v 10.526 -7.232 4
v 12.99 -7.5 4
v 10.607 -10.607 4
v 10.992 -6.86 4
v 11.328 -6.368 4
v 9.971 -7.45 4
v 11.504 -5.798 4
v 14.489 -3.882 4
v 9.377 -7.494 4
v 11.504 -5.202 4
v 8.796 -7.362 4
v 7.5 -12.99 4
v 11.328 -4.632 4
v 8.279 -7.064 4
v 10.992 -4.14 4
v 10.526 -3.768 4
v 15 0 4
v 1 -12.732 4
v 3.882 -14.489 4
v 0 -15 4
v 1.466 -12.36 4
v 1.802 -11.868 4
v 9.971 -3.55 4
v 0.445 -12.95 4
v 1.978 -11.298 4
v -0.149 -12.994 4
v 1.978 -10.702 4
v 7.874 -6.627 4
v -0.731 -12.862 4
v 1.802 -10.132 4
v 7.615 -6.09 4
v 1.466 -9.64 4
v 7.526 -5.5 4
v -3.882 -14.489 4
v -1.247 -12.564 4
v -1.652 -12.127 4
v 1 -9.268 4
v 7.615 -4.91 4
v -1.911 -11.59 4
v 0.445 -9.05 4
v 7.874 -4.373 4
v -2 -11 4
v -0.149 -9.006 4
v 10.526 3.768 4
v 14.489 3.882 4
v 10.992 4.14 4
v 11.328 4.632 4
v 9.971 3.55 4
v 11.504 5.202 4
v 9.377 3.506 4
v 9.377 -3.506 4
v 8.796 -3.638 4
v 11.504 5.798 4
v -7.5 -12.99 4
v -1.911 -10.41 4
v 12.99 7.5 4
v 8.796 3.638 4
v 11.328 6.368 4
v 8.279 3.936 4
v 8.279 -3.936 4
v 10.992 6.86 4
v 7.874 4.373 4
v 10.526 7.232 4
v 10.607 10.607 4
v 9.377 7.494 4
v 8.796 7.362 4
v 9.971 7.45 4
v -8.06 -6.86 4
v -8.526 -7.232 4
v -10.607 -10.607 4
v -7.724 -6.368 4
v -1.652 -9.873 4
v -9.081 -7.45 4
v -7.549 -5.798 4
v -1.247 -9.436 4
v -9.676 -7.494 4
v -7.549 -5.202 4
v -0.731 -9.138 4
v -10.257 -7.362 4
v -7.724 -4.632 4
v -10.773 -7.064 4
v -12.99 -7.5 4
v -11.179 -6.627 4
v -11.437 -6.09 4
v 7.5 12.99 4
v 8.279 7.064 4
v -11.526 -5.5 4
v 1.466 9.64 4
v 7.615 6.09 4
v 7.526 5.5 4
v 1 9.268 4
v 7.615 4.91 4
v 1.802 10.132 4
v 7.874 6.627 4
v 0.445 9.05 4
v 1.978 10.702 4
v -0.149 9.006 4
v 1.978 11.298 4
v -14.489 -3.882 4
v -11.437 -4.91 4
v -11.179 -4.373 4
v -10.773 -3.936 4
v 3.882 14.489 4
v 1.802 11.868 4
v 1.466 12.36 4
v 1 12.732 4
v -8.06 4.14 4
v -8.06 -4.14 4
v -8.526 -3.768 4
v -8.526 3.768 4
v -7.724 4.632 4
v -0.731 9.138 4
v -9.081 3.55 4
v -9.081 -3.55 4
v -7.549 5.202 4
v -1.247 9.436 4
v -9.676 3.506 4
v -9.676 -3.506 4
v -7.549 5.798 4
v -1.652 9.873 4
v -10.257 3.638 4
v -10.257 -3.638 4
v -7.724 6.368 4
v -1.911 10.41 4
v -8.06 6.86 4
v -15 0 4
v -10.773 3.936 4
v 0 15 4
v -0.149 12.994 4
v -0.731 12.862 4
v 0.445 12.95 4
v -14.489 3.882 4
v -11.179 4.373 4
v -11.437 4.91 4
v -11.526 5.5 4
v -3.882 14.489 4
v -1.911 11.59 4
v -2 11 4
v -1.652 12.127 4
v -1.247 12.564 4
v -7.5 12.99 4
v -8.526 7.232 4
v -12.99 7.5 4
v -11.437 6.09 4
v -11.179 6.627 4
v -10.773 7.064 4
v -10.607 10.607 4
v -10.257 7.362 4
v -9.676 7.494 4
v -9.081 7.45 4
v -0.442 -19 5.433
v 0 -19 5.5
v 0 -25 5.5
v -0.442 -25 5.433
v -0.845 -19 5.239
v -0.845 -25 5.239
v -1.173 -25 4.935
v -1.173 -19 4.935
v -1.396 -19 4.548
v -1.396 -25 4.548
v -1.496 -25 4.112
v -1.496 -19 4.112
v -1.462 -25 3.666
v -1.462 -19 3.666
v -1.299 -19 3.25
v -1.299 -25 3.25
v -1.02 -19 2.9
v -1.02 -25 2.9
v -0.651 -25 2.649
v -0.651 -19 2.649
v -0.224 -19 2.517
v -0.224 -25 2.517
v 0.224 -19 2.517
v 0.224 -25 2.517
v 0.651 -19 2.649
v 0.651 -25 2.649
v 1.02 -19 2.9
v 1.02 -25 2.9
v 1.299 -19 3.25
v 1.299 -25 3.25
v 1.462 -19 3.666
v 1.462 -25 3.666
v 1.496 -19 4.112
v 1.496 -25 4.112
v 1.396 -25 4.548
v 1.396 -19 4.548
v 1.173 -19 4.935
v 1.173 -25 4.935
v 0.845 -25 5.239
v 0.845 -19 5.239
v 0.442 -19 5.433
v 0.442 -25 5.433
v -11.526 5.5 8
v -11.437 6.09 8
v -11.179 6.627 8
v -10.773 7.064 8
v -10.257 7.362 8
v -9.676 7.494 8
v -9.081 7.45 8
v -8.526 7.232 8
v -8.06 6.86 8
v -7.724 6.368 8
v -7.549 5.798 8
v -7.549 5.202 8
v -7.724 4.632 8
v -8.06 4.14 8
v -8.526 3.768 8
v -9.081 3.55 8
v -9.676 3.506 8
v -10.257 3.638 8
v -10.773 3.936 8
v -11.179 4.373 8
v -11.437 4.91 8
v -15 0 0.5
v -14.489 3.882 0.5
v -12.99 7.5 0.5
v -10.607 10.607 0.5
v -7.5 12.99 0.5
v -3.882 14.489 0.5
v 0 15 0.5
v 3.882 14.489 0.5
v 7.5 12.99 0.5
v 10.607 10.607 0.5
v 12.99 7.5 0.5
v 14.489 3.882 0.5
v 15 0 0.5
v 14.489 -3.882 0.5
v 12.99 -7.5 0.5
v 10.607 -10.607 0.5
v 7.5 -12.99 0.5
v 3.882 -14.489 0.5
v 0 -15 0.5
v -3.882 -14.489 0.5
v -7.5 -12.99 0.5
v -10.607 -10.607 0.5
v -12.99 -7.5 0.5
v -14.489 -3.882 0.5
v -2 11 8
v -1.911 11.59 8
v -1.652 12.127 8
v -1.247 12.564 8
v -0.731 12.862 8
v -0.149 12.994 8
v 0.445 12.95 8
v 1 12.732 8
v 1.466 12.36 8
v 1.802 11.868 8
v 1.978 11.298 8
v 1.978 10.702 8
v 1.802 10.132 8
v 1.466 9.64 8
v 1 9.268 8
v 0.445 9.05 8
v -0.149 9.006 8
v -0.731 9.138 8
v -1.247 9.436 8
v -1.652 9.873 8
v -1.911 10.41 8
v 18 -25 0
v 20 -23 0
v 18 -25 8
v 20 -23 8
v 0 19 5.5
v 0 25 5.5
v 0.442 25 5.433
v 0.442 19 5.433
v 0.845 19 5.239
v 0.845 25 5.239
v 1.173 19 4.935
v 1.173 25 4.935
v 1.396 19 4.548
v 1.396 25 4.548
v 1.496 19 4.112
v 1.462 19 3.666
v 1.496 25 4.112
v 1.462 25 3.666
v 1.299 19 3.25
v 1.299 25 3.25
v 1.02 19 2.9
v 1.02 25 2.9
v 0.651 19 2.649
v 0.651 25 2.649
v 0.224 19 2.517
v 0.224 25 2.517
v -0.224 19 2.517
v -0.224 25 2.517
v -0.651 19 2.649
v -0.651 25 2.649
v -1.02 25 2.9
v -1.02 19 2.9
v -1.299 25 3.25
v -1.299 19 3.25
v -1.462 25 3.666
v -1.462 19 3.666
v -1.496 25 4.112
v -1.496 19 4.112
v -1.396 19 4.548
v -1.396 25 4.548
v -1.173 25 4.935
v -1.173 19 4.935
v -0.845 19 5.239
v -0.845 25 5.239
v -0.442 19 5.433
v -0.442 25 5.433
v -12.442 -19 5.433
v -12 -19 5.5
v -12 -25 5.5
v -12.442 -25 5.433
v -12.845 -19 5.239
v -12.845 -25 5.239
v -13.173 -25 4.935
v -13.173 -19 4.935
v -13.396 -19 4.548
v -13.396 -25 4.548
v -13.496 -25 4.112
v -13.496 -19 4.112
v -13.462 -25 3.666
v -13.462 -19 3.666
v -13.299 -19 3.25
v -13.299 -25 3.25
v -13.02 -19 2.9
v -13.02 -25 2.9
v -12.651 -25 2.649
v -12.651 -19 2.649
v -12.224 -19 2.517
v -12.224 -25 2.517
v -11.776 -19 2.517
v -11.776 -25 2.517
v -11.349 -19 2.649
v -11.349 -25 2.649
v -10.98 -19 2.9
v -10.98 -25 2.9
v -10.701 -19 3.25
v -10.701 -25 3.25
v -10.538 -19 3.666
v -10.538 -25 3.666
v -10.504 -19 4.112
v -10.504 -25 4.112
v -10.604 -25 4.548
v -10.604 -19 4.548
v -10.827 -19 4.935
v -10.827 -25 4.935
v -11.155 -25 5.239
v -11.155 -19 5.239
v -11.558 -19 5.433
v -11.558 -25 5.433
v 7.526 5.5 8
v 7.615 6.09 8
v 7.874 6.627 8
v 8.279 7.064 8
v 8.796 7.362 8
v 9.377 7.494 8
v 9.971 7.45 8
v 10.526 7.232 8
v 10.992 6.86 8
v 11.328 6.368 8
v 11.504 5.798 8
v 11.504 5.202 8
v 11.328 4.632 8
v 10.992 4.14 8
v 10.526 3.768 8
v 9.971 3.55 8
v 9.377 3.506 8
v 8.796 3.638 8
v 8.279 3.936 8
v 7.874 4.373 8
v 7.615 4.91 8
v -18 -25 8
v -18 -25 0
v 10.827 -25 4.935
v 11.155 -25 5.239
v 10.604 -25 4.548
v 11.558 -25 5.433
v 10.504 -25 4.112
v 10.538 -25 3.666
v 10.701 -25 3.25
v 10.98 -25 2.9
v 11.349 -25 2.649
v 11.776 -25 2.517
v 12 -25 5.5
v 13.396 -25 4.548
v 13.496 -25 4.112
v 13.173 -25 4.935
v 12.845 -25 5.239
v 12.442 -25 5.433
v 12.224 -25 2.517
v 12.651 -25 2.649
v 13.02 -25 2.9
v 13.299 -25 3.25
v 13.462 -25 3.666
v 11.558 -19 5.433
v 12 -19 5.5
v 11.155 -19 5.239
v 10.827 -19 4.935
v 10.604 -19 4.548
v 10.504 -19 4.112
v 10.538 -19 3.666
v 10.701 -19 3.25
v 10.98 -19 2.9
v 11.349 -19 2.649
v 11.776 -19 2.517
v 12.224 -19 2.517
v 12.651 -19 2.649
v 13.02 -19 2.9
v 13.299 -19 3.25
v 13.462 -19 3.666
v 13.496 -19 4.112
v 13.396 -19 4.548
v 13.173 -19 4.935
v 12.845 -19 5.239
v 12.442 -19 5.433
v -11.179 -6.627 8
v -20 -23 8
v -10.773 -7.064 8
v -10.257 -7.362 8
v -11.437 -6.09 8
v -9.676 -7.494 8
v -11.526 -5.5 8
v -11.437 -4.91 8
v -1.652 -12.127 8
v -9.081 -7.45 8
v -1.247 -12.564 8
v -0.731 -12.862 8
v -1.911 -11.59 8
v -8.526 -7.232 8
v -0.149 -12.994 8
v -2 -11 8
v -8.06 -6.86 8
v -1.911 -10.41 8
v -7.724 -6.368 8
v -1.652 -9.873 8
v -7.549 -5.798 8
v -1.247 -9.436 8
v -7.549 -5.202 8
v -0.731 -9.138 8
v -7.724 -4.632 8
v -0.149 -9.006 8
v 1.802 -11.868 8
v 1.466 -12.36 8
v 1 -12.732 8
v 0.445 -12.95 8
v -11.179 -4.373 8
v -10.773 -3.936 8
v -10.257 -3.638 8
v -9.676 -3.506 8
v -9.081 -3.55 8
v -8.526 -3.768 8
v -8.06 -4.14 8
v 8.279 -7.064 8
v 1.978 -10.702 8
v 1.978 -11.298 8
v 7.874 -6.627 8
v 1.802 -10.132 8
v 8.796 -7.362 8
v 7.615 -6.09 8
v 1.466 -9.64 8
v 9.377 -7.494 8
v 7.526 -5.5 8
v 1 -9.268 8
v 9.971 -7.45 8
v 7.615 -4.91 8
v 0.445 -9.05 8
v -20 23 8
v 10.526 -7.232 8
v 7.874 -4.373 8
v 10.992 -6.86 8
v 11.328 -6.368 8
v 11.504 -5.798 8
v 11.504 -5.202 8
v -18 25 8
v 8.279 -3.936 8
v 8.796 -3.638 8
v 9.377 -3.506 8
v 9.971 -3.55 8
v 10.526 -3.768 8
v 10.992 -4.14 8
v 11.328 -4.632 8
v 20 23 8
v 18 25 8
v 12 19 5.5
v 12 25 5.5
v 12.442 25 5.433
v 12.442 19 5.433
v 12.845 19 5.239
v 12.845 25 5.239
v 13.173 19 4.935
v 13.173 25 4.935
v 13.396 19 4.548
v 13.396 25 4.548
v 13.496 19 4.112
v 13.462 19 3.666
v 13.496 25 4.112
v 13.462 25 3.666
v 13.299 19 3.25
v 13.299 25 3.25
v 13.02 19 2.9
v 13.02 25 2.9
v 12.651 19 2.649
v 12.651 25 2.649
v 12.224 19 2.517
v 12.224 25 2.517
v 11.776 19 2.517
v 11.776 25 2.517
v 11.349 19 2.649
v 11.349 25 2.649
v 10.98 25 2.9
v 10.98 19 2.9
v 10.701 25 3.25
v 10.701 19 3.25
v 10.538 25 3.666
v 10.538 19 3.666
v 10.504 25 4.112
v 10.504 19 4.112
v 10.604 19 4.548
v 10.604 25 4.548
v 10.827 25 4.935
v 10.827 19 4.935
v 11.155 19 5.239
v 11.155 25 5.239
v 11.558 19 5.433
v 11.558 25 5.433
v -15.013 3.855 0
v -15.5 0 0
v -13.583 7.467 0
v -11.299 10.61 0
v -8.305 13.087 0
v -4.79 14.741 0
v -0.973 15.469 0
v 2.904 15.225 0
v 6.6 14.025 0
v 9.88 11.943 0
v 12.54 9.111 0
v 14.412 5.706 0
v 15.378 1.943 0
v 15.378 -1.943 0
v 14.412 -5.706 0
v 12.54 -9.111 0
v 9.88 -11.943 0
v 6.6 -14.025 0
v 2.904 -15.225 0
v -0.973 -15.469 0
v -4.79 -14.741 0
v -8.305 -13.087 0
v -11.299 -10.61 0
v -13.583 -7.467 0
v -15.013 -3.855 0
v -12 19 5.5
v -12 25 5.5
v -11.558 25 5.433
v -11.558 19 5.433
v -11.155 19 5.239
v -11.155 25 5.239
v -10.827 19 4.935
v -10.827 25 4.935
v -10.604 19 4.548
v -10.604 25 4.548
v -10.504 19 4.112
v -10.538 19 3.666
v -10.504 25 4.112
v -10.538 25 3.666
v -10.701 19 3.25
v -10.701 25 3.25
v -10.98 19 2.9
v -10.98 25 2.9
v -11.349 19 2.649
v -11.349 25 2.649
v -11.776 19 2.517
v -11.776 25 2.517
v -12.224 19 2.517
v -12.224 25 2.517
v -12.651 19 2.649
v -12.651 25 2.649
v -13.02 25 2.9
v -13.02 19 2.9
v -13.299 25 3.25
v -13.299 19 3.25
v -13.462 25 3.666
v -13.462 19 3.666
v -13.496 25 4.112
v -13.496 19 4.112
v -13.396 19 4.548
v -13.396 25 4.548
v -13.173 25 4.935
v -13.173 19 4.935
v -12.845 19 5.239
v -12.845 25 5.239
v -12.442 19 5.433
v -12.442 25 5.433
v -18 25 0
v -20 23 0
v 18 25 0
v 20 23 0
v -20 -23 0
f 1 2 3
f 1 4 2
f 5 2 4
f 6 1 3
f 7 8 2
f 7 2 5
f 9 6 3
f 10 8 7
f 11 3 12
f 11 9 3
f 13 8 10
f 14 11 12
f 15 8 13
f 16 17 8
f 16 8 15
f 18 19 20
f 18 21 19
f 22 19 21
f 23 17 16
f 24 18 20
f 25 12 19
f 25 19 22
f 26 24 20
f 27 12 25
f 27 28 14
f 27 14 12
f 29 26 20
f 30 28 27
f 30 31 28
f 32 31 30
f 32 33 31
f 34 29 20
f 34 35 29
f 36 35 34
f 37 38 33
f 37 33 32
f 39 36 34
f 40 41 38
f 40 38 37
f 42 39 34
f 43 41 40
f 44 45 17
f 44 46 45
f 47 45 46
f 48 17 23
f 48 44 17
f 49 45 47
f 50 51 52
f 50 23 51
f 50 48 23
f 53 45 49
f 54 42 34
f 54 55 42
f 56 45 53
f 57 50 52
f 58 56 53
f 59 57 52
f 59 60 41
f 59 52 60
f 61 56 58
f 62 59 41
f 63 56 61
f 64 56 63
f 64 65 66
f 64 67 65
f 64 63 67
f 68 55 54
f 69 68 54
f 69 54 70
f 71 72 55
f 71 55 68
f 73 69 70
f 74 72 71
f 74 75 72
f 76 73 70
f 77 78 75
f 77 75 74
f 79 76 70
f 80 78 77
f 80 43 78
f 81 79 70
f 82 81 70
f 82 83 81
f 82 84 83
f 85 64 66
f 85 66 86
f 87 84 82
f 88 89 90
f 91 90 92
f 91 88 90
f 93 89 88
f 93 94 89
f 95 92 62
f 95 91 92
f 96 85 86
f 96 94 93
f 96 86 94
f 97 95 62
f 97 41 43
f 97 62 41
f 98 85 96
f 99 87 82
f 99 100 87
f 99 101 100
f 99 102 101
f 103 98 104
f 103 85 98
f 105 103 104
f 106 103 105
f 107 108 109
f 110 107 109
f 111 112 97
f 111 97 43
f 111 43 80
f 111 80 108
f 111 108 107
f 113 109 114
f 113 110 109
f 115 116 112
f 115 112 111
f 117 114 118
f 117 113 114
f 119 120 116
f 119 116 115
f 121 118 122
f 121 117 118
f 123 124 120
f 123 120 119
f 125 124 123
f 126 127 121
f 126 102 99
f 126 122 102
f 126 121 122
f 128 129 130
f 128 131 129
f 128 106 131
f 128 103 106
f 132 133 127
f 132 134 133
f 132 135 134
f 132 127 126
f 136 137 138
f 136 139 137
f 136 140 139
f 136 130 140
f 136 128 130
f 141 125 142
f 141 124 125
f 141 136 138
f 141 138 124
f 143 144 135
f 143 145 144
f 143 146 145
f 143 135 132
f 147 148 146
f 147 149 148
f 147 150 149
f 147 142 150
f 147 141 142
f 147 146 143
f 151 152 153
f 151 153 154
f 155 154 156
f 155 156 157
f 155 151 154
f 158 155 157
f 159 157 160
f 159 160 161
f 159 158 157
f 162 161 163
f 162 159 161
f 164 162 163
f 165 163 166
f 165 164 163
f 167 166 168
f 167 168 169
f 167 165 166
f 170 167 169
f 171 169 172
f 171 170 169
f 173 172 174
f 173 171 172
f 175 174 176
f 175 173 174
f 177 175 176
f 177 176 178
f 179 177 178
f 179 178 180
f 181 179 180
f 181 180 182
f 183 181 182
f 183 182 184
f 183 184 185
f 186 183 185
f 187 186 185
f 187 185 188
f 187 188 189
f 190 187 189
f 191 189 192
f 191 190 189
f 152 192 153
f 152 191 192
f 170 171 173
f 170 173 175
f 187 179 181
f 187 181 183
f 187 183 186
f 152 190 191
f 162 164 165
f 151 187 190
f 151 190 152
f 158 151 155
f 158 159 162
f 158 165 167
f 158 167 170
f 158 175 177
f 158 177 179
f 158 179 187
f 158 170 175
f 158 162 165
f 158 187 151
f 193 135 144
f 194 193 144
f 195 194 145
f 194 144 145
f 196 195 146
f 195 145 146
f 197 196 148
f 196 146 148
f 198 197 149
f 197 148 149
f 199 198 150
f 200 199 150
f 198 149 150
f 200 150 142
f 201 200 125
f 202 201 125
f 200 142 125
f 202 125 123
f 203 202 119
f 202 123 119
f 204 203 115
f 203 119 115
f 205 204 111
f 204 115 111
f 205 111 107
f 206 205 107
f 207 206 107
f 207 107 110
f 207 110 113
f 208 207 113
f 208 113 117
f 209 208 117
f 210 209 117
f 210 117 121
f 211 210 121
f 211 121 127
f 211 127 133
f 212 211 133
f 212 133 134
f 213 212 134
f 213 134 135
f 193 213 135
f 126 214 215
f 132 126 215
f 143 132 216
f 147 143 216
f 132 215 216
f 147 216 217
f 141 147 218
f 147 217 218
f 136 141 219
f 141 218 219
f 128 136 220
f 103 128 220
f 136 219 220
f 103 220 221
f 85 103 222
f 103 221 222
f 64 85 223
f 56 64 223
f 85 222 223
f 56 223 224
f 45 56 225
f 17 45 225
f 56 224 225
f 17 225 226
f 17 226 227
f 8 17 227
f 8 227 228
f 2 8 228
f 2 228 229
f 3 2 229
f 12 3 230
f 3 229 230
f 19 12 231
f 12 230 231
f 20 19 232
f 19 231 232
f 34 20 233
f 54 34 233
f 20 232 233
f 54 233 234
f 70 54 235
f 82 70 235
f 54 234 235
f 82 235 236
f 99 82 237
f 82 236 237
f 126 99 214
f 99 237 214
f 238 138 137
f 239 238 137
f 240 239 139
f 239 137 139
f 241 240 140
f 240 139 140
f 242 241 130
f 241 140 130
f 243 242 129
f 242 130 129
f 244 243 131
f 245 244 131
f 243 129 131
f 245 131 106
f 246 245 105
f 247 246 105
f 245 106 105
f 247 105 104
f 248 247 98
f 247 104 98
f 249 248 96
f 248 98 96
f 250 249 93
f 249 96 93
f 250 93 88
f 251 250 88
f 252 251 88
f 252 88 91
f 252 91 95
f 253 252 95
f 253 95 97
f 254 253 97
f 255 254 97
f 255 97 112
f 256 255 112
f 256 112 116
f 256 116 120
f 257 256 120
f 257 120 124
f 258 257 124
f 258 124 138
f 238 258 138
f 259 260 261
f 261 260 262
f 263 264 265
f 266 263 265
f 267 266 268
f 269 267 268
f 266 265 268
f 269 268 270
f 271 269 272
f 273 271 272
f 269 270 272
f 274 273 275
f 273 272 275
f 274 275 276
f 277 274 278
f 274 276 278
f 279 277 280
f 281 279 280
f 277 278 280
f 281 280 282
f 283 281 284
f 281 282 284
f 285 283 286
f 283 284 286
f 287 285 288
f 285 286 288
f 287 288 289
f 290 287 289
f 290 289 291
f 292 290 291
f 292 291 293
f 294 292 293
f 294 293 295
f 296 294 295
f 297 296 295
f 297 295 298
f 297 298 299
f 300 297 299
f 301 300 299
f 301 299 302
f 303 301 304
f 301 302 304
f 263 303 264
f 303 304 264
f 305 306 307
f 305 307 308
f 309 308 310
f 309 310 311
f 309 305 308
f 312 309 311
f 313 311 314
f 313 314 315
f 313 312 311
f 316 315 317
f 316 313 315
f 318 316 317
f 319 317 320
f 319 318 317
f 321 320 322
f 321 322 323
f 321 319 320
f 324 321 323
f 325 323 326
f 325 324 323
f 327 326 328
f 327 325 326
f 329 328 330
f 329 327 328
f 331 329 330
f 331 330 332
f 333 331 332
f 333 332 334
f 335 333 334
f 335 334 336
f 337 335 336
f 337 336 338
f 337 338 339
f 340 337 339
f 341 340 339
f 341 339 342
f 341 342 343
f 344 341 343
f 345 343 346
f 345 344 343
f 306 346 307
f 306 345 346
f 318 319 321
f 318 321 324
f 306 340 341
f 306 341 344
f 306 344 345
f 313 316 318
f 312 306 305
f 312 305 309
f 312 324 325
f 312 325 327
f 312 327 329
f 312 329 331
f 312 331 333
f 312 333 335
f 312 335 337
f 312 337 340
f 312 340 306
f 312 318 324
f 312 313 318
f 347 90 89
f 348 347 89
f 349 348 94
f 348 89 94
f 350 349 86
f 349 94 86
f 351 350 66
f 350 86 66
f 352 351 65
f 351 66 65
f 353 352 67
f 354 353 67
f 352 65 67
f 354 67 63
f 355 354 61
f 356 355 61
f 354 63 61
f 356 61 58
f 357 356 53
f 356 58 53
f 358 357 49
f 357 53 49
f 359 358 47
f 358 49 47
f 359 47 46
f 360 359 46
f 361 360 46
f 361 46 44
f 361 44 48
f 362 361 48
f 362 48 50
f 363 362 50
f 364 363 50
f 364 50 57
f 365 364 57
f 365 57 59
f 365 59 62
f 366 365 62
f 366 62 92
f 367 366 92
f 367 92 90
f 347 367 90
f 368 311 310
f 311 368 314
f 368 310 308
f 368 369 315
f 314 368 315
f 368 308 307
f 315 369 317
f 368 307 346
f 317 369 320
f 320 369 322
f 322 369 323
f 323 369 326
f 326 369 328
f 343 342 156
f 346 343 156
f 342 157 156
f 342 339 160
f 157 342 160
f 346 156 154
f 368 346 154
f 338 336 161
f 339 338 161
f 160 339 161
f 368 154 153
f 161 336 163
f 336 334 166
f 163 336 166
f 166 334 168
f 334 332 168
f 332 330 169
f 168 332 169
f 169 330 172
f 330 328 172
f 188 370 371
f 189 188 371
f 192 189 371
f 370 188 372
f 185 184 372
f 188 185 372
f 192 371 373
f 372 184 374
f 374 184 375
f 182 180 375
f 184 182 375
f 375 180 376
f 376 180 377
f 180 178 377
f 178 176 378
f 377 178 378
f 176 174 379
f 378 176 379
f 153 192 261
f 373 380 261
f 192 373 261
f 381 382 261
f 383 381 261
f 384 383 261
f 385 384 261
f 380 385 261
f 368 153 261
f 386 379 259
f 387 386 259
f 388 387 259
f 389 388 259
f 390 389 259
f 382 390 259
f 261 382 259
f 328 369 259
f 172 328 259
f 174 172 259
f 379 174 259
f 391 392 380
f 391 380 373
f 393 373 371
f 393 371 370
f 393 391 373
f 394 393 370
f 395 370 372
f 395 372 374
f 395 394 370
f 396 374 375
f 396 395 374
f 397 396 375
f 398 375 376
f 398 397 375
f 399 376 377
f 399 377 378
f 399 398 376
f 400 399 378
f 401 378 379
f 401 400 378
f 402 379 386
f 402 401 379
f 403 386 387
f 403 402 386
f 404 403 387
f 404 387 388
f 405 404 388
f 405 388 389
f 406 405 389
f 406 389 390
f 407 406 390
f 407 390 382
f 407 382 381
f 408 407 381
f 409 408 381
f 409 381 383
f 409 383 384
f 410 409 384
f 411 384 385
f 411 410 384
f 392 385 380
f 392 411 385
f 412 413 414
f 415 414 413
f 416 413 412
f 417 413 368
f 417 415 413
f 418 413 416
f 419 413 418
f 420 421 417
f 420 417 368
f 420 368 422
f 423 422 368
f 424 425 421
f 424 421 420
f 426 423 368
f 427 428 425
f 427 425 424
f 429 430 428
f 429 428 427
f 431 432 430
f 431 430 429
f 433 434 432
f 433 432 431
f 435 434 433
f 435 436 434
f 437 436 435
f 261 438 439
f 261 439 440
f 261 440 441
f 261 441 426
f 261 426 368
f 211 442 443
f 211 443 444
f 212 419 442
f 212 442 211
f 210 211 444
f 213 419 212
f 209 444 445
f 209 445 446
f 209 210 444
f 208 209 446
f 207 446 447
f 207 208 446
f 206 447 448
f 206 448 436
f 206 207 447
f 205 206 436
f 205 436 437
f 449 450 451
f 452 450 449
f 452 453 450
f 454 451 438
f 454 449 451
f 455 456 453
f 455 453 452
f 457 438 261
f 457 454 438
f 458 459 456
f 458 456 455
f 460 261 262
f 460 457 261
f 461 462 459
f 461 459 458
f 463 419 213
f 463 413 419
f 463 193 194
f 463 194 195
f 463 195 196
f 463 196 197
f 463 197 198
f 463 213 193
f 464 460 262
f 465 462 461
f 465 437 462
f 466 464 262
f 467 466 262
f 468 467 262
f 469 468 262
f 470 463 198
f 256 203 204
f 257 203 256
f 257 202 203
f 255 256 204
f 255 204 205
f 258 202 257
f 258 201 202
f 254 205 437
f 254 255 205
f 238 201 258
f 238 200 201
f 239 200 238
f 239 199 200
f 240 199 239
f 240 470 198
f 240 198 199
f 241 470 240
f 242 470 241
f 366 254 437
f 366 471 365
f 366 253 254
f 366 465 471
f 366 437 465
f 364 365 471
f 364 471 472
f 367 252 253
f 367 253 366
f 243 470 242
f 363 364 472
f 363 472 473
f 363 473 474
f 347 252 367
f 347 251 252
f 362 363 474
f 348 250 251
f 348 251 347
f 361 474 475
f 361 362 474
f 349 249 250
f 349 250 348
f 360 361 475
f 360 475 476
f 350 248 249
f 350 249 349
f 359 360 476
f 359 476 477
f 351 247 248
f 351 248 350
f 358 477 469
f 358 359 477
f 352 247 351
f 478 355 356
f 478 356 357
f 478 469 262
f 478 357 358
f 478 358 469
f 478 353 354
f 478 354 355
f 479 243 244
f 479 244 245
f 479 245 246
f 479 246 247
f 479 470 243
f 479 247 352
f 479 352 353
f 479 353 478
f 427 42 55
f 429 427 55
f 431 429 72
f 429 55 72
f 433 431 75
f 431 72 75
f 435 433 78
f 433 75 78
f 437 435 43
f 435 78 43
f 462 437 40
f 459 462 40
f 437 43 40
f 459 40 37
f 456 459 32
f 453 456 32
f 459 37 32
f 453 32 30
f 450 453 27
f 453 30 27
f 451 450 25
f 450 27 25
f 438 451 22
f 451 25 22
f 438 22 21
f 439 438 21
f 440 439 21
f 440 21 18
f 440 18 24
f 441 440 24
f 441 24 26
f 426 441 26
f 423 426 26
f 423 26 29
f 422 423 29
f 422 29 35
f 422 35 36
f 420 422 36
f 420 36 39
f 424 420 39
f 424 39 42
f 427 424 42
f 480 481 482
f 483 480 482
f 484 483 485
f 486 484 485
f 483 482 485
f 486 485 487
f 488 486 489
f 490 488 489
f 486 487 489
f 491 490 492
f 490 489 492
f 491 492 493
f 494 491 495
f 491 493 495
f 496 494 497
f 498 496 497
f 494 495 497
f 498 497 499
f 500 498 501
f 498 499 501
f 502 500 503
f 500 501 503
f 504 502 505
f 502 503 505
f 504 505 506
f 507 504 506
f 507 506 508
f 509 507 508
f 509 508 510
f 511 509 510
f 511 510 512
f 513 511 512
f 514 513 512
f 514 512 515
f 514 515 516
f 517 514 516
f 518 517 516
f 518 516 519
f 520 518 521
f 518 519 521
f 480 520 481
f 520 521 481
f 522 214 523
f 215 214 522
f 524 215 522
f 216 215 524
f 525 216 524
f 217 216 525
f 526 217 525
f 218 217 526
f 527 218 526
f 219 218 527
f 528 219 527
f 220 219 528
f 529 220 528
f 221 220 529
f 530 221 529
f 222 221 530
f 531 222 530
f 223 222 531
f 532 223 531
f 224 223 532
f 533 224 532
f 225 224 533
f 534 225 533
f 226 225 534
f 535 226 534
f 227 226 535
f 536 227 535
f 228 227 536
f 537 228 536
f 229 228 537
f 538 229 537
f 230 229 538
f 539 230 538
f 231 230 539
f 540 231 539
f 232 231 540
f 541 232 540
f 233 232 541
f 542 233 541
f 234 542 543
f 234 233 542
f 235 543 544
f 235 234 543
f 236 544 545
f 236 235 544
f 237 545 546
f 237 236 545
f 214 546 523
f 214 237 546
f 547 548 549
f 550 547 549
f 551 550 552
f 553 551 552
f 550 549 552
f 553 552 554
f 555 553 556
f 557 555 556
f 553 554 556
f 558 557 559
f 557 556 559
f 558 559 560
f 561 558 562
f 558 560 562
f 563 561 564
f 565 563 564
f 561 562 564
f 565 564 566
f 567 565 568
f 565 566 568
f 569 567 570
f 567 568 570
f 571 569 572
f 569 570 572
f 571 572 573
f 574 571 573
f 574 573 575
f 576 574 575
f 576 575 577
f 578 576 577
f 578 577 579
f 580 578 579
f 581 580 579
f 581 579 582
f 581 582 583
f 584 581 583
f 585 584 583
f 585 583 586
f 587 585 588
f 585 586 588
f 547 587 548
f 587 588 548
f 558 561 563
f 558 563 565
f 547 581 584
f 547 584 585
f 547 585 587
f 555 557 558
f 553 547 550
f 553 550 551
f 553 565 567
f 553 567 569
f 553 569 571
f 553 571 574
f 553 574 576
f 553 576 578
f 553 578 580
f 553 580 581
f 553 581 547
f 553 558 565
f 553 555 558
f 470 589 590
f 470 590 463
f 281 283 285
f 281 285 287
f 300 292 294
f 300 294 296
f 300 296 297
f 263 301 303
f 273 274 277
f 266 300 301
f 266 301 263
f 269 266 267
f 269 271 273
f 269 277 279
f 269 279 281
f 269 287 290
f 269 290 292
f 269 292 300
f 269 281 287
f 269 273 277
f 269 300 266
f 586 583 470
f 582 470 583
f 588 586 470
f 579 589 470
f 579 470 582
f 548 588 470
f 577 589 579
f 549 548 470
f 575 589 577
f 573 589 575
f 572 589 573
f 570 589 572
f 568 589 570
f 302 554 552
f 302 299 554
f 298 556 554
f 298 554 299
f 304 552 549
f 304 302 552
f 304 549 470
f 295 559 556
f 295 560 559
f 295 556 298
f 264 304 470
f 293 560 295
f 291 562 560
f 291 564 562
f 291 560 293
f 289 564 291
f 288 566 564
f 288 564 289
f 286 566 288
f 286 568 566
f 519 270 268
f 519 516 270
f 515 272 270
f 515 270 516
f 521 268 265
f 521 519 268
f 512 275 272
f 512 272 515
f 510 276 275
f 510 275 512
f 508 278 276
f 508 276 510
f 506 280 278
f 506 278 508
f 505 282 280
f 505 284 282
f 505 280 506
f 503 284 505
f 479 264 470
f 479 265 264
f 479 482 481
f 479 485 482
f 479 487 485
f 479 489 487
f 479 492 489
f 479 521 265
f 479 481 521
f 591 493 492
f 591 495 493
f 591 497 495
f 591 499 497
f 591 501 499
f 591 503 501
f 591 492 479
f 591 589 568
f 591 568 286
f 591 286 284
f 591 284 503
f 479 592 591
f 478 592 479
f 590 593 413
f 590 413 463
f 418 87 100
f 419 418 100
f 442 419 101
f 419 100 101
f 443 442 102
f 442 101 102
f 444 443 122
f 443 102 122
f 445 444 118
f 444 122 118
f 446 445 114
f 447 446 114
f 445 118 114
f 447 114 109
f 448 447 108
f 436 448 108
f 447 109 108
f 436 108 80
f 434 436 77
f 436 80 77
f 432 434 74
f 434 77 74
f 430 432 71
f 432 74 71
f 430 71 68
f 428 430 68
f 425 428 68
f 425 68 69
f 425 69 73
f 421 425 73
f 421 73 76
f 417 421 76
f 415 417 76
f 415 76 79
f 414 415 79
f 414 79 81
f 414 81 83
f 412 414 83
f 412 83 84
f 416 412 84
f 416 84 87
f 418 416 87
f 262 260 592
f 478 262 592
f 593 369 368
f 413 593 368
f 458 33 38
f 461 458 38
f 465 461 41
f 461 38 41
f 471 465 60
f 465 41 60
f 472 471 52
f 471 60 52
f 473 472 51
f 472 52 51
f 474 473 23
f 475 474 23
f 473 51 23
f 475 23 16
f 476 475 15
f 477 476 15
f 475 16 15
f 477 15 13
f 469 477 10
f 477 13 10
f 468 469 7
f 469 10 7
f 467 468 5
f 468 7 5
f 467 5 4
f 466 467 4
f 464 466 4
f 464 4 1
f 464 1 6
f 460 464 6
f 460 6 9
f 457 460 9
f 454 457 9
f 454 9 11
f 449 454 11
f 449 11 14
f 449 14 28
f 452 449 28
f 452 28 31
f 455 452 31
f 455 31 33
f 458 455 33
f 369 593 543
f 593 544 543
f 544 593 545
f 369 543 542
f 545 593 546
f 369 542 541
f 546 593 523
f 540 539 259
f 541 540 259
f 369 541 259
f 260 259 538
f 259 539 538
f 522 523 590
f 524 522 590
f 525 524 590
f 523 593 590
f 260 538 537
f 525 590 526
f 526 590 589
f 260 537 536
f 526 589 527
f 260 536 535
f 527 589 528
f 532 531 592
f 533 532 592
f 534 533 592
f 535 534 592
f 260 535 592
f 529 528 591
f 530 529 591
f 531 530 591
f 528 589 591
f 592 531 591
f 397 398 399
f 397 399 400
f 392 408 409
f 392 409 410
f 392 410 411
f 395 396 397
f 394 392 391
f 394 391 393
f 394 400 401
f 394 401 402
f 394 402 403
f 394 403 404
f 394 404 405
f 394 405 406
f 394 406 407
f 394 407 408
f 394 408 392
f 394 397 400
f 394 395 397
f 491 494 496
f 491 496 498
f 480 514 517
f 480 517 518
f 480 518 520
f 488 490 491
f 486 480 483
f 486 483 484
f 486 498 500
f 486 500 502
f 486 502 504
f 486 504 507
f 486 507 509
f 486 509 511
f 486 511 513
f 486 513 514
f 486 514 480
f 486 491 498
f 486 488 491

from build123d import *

# Parameters (mm, degrees)
SKETCH_1_W          = 40
SKETCH_1_H          = 50
EXTRUDE_1_DEPTH     = 8
SKETCH_2_R          = 15
CUT_EXTRUDE_1_DEPTH = 4
SKETCH_3_R          = 2
CUT_EXTRUDE_2_DEPTH = 10
CHAMFER_1_SIZE      = 2
SKETCH_4_R          = 1.5
CUT_EXTRUDE_3_DEPTH = 6
CUT_EXTRUDE_START   = -6
SKETCH_5_R          = 1.5
CUT_EXTRUDE_4_DEPTH = 6
CHAMFER_2_SIZE      = 0.5


with BuildPart() as part:
    # 草图1 → 凸台-拉伸1 (new body)
    with BuildSketch(Plane.XY):
        Rectangle(SKETCH_1_W, SKETCH_1_H)
    extrude(amount=EXTRUDE_1_DEPTH)

    # 草图2 → 切除-拉伸1 (cut)
    with BuildSketch(Plane(origin=(0, 0, 0), x_dir=(-1, 0, 0), z_dir=(0, 0, -1))):
        Circle(SKETCH_2_R)
    extrude(amount=-CUT_EXTRUDE_1_DEPTH, mode=Mode.SUBTRACT)

    # 草图3 → 切除-拉伸2 (cut)
    with BuildSketch(Plane(origin=(0, 0, 4), x_dir=(-1, 0, 0), z_dir=(0, 0, -1))):
        with Locations((0, 11)):
            Circle(SKETCH_3_R)
        with Locations((9.526279442, 5.5)):
            Circle(SKETCH_3_R)
        with Locations((9.526279442, -5.5)):
            Circle(SKETCH_3_R)
        with Locations((0, -11)):
            Circle(SKETCH_3_R)
        with Locations((-9.526279442, -5.5)):
            Circle(SKETCH_3_R)
        with Locations((-9.526279442, 5.5)):
            Circle(SKETCH_3_R)
    extrude(amount=-CUT_EXTRUDE_2_DEPTH, mode=Mode.SUBTRACT)

    # 倒角1
    chamfer_1_edges = [part.edges().sort_by_distance(p)[0] for p in [
        (20, -25, 4),
        (-20, -25, 4),
        (-20, 25, 4),
        (20, 25, 4),
    ]]
    chamfer(chamfer_1_edges, length=CHAMFER_1_SIZE)

    # 草图4 → 切除-拉伸3 (cut)
    with BuildSketch(Plane(origin=(0, 25, 0), x_dir=(1, 0, 0), z_dir=(0, 1, 0))):
        with Locations(Location((-12, -4, 0), (0, 0, 270))):
            Circle(SKETCH_4_R)
        with Locations(Location((0, -4, 0), (0, 0, 270))):
            Circle(SKETCH_4_R)
        with Locations(Location((12, -4, 0), (0, 0, 270))):
            Circle(SKETCH_4_R)
    extrude(amount=-CUT_EXTRUDE_3_DEPTH, mode=Mode.SUBTRACT)

    # 草图5 → 切除-拉伸4 (cut)
    with BuildSketch(Plane.XZ.offset(25).offset(CUT_EXTRUDE_START)):
        with Locations(Location((-12, 4, 0), (0, 0, 90))):
            Circle(SKETCH_5_R)
        with Locations(Location((0, 4, 0), (0, 0, 90))):
            Circle(SKETCH_5_R)
        with Locations(Location((12, 4, 0), (0, 0, 90))):
            Circle(SKETCH_5_R)
    extrude(amount=CUT_EXTRUDE_4_DEPTH, mode=Mode.SUBTRACT)

    # 倒角2
    chamfer_2_edges = [part.edges().sort_by_distance(p)[0] for p in [
        (15, 0, 0),
    ]]
    chamfer(chamfer_2_edges, length=CHAMFER_2_SIZE)


solid = part.part
